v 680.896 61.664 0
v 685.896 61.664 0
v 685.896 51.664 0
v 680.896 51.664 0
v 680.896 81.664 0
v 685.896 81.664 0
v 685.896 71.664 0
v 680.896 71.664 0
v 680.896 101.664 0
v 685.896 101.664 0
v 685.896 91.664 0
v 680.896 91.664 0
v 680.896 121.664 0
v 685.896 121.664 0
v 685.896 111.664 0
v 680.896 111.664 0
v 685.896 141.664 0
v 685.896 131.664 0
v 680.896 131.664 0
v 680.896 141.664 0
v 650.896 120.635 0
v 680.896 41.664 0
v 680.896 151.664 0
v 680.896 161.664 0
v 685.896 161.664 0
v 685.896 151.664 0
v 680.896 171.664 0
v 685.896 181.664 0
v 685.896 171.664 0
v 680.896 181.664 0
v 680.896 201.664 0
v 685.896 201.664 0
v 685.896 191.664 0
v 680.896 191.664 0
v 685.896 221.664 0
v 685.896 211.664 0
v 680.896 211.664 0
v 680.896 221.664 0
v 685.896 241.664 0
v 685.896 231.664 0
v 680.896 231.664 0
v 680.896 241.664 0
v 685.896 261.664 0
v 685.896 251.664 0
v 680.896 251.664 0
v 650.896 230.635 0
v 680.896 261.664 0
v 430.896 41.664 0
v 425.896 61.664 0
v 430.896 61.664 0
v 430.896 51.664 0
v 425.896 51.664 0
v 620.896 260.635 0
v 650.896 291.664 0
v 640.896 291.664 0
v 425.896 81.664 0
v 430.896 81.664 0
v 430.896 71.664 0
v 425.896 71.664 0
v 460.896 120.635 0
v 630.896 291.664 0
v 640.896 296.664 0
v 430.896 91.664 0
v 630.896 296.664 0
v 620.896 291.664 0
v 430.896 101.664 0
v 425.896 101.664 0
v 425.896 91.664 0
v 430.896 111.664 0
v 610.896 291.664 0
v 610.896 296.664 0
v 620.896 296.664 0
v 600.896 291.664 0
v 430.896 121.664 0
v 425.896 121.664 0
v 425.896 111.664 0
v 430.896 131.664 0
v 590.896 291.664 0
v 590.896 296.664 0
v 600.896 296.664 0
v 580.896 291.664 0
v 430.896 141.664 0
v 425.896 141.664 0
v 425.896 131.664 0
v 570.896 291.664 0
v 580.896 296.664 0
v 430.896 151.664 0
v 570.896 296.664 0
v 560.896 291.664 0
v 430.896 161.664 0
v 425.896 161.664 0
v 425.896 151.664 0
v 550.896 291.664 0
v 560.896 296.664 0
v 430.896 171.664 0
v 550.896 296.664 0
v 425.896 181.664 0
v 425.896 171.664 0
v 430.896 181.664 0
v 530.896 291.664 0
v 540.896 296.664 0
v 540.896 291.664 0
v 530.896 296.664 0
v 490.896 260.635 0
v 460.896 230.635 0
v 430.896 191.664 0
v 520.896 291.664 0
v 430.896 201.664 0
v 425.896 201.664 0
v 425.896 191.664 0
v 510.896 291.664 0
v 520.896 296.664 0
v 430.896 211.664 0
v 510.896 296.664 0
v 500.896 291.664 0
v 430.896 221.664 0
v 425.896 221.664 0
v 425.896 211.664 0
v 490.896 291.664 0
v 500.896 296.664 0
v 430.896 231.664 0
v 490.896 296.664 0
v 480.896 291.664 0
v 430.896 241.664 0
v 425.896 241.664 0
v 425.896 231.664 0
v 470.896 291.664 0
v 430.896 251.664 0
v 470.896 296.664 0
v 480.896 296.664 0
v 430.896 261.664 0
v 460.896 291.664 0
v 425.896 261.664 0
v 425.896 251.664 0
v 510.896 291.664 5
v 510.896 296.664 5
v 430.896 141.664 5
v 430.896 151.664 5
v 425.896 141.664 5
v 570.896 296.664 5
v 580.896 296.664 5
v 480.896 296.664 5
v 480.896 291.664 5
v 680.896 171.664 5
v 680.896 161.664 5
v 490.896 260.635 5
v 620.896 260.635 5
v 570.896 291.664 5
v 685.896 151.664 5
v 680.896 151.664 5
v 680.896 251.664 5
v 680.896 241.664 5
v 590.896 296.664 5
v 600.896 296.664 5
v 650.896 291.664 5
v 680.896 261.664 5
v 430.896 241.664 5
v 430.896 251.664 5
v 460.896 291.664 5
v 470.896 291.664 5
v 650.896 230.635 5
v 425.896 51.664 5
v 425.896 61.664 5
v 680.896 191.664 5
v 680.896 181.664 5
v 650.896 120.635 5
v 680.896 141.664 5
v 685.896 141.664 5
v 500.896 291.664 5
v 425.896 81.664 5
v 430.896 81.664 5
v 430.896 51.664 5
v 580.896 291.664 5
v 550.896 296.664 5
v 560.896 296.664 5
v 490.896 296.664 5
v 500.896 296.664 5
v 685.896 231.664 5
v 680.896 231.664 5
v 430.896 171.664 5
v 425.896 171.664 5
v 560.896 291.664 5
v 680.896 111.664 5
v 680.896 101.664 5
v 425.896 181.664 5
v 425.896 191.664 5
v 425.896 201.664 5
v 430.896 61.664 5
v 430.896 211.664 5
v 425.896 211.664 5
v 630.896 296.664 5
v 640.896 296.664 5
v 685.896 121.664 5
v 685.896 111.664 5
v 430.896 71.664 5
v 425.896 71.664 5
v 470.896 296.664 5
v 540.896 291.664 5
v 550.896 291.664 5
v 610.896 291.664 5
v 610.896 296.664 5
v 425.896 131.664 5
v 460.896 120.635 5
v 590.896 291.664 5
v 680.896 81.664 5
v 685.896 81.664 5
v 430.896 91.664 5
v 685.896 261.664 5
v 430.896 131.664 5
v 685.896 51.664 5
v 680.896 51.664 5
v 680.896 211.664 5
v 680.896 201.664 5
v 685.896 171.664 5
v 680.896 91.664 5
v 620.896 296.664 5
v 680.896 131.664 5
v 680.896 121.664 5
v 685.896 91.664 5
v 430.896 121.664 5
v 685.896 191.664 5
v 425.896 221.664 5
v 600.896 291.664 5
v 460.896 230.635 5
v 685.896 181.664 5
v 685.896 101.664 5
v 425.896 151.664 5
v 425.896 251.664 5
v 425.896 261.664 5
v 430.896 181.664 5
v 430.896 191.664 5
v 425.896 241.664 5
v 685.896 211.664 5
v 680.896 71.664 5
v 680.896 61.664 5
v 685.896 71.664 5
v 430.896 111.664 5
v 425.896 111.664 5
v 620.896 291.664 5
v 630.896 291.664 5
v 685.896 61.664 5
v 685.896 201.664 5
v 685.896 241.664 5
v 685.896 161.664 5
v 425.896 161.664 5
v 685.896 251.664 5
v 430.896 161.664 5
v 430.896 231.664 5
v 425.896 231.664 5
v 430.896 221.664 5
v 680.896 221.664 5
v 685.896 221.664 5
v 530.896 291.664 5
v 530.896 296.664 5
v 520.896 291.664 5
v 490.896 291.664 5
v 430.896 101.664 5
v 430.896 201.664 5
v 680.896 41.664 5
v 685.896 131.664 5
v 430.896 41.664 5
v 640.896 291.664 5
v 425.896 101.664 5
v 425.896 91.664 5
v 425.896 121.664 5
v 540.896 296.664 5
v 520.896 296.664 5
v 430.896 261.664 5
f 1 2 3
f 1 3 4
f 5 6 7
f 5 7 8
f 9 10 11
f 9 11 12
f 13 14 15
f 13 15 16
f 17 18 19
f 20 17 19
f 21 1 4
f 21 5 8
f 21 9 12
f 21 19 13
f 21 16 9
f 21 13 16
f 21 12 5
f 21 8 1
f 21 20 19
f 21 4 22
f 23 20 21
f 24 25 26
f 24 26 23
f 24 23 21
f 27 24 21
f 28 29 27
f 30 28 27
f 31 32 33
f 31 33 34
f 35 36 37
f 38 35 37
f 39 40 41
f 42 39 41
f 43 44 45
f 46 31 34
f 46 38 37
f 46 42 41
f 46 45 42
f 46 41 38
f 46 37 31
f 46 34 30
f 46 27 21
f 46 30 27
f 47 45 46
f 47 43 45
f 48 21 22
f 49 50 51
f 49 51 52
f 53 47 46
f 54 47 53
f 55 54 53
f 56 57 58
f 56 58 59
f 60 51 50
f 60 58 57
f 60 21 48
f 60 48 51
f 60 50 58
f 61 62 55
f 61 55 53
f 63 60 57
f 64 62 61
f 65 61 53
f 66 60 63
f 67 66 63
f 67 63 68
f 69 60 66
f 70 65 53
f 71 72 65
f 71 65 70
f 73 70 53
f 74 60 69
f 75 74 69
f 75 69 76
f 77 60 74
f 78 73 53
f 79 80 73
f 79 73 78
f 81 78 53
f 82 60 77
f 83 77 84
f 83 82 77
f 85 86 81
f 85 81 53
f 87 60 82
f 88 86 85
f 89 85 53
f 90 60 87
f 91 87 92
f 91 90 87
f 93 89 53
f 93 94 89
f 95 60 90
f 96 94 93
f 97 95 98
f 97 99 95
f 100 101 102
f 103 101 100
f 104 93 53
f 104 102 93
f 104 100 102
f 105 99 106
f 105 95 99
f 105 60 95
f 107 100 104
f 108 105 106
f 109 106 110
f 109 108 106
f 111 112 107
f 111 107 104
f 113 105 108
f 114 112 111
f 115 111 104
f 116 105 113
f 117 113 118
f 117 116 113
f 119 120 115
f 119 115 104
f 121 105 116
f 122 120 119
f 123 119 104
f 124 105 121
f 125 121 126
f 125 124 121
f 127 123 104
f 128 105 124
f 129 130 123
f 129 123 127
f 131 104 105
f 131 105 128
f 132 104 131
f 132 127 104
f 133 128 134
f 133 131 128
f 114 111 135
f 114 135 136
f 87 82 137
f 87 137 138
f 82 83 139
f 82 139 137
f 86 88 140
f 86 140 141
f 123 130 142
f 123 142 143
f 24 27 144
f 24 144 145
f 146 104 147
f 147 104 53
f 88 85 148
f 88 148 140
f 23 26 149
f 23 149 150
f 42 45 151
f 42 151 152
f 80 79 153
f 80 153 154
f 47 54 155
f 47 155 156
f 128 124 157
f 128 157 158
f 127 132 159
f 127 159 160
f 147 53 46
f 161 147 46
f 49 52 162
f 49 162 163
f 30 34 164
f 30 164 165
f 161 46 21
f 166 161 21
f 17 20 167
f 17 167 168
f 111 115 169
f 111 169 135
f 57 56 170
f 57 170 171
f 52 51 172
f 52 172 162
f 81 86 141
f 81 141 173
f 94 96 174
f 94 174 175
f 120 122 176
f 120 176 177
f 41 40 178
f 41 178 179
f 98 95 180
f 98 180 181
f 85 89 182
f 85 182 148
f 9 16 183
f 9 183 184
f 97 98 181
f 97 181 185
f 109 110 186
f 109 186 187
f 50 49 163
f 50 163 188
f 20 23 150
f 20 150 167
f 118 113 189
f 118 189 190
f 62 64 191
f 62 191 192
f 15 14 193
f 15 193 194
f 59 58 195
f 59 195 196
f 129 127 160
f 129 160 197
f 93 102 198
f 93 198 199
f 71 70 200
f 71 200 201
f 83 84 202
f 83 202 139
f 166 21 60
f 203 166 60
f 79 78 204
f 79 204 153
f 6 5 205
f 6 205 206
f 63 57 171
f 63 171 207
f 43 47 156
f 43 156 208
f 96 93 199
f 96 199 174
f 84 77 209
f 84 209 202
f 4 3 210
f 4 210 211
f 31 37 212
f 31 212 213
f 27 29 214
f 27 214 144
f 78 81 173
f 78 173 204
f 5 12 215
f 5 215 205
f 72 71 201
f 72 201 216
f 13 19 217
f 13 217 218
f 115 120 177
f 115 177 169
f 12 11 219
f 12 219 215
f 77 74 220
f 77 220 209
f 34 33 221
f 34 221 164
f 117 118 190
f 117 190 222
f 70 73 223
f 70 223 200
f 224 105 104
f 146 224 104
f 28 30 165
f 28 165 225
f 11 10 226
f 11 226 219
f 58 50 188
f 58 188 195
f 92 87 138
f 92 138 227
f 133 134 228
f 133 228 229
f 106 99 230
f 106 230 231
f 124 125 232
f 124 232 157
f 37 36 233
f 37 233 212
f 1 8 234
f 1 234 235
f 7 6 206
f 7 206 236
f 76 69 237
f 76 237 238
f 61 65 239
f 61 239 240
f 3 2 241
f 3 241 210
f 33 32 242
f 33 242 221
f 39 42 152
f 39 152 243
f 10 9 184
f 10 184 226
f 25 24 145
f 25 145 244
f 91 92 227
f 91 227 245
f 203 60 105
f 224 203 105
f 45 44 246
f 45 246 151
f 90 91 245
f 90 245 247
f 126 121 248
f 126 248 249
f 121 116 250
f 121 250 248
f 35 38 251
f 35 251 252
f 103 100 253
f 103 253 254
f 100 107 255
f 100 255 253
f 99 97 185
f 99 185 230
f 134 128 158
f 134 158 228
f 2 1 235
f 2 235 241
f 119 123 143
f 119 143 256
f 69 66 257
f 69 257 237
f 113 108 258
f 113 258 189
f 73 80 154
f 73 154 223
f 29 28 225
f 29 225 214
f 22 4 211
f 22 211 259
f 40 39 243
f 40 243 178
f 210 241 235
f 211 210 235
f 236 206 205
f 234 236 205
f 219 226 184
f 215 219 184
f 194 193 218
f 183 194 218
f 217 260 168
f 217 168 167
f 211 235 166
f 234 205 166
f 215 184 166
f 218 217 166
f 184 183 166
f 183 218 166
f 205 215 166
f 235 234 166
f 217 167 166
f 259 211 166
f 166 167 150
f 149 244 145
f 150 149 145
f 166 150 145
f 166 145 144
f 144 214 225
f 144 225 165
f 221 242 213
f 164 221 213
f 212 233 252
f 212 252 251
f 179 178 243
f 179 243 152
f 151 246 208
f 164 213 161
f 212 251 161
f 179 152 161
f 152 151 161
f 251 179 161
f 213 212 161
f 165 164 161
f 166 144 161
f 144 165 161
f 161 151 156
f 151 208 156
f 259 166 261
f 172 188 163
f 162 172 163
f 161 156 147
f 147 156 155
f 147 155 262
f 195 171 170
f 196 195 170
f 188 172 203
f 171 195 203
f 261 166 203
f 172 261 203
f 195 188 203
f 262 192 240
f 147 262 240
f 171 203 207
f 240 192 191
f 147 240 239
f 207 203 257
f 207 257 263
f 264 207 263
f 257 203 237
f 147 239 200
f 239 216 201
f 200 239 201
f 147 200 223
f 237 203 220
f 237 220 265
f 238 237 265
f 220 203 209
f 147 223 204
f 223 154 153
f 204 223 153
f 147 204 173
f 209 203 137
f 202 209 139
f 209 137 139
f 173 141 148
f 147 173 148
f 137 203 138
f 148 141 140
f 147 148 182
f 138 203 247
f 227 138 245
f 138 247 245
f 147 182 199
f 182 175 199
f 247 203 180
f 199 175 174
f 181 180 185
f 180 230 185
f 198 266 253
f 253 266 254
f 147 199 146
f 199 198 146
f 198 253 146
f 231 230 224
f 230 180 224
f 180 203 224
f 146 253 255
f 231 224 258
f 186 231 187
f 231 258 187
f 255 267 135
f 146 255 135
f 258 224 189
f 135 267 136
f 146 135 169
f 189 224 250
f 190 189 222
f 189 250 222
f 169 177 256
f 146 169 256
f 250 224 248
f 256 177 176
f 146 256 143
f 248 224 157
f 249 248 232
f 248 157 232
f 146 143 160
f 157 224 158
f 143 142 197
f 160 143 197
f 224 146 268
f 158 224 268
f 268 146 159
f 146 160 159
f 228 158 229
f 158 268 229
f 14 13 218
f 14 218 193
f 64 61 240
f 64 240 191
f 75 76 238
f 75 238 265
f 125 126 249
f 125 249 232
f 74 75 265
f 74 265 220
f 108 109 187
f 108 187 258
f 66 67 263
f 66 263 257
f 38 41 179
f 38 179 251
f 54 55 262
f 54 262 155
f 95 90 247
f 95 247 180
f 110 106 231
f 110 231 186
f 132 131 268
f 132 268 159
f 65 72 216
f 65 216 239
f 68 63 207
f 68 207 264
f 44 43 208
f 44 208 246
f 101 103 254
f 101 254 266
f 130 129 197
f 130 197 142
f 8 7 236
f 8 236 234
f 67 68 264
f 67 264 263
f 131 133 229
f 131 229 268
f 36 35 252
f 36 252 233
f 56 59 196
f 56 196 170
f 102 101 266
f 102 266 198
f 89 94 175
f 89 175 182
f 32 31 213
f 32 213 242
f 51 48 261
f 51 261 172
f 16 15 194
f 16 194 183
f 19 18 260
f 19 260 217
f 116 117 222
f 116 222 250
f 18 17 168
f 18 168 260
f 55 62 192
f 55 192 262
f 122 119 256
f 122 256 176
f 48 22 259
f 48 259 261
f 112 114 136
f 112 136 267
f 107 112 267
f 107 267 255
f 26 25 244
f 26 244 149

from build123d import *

# Parameters (mm, degrees)
AUFSATZ_LINEAR_AUSTRAGEN1_DEPTH = 5


with BuildPart() as part:
    # Skizze1 → Aufsatz-Linear austragen1 (new body)
    with BuildSketch(Plane.XY):
        Polygon((460.89618142, 291.663856447), (470.89618142, 291.663856447), (470.89618142, 296.663856447), (480.89618142, 296.663856447), (480.89618142, 291.663856447), (490.89618142, 291.663856447), (490.89618142, 296.663856447), (500.89618142, 296.663856447), (500.89618142, 291.663856447), (510.89618142, 291.663856447), (510.89618142, 296.663856447), (520.89618142, 296.663856447), (520.89618142, 291.663856447), (530.89618142, 291.663856447), (530.89618142, 296.663856447), (540.89618142, 296.663856447), (540.89618142, 291.663856447), (550.89618142, 291.663856447), (550.89618142, 296.663856447), (560.89618142, 296.663856447), (560.89618142, 291.663856447), (570.89618142, 291.663856447), (570.89618142, 296.663856447), (580.89618142, 296.663856447), (580.89618142, 291.663856447), (590.89618142, 291.663856447), (590.89618142, 296.663856447), (600.89618142, 296.663856447), (600.89618142, 291.663856447), (610.89618142, 291.663856447), (610.89618142, 296.663856447), (620.89618142, 296.663856447), (620.89618142, 291.663856447), (630.89618142, 291.663856447), (630.89618142, 296.663856447), (640.89618142, 296.663856447), (640.89618142, 291.663856447), (650.89618142, 291.663856447), (680.89618142, 261.663856447), (685.89618142, 261.663856447), (685.89618142, 251.663856447), (680.89618142, 251.663856447), (680.89618142, 241.663856447), (685.89618142, 241.663856447), (685.89618142, 231.663856447), (680.89618142, 231.663856447), (680.89618142, 221.663856447), (685.89618142, 221.663856447), (685.89618142, 211.663856447), (680.89618142, 211.663856447), (680.89618142, 201.663856447), (685.89618142, 201.663856447), (685.89618142, 191.663856447), (680.89618142, 191.663856447), (680.89618142, 181.663856447), (685.89618142, 181.663856447), (685.89618142, 171.663856447), (680.89618142, 171.663856447), (680.89618142, 161.663856447), (685.89618142, 161.663856447), (685.89618142, 151.663856447), (680.89618142, 151.663856447), (680.89618142, 141.663856447), (685.89618142, 141.663856447), (685.89618142, 131.663856447), (680.89618142, 131.663856447), (680.89618142, 121.663856447), (685.89618142, 121.663856447), (685.89618142, 111.663856447), (680.89618142, 111.663856447), (680.89618142, 101.663856447), (685.89618142, 101.663856447), (685.89618142, 91.663856447), (680.89618142, 91.663856447), (680.89618142, 81.663856447), (685.89618142, 81.663856447), (685.89618142, 71.663856447), (680.89618142, 71.663856447), (680.89618142, 61.663856447), (685.89618142, 61.663856447), (685.89618142, 51.663856447), (680.89618142, 51.663856447), (680.89618142, 41.663856447), (430.89618142, 41.663856447), (430.89618142, 51.663856447), (425.89618142, 51.663856447), (425.89618142, 61.663856447), (430.89618142, 61.663856447), (430.89618142, 71.663856447), (425.89618142, 71.663856447), (425.89618142, 81.663856447), (430.89618142, 81.663856447), (430.89618142, 91.663856447), (425.89618142, 91.663856447), (425.89618142, 101.663856447), (430.89618142, 101.663856447), (430.89618142, 111.663856447), (425.89618142, 111.663856447), (425.89618142, 121.663856447), (430.89618142, 121.663856447), (430.89618142, 131.663856447), (425.89618142, 131.663856447), (425.89618142, 141.663856447), (430.89618142, 141.663856447), (430.89618142, 151.663856447), (425.89618142, 151.663856447), (425.89618142, 161.663856447), (430.89618142, 161.663856447), (430.89618142, 171.663856447), (425.89618142, 171.663856447), (425.89618142, 181.663856447), (430.89618142, 181.663856447), (430.89618142, 191.663856447), (425.89618142, 191.663856447), (425.89618142, 201.663856447), (430.89618142, 201.663856447), (430.89618142, 211.663856447), (425.89618142, 211.663856447), (425.89618142, 221.663856447), (430.89618142, 221.663856447), (430.89618142, 231.663856447), (425.89618142, 231.663856447), (425.89618142, 241.663856447), (430.89618142, 241.663856447), (430.89618142, 251.663856447), (425.89618142, 251.663856447), (425.89618142, 261.663856447), (430.89618142, 261.663856447), align=None)
        Polygon((490.89618142, 260.635021844), (620.89618142, 260.635021844), (650.89618142, 230.635021844), (650.89618142, 120.635021844), (460.89618142, 120.635021844), (460.89618142, 230.635021844), align=None, mode=Mode.SUBTRACT)
    extrude(amount=AUFSATZ_LINEAR_AUSTRAGEN1_DEPTH)


solid = part.part
